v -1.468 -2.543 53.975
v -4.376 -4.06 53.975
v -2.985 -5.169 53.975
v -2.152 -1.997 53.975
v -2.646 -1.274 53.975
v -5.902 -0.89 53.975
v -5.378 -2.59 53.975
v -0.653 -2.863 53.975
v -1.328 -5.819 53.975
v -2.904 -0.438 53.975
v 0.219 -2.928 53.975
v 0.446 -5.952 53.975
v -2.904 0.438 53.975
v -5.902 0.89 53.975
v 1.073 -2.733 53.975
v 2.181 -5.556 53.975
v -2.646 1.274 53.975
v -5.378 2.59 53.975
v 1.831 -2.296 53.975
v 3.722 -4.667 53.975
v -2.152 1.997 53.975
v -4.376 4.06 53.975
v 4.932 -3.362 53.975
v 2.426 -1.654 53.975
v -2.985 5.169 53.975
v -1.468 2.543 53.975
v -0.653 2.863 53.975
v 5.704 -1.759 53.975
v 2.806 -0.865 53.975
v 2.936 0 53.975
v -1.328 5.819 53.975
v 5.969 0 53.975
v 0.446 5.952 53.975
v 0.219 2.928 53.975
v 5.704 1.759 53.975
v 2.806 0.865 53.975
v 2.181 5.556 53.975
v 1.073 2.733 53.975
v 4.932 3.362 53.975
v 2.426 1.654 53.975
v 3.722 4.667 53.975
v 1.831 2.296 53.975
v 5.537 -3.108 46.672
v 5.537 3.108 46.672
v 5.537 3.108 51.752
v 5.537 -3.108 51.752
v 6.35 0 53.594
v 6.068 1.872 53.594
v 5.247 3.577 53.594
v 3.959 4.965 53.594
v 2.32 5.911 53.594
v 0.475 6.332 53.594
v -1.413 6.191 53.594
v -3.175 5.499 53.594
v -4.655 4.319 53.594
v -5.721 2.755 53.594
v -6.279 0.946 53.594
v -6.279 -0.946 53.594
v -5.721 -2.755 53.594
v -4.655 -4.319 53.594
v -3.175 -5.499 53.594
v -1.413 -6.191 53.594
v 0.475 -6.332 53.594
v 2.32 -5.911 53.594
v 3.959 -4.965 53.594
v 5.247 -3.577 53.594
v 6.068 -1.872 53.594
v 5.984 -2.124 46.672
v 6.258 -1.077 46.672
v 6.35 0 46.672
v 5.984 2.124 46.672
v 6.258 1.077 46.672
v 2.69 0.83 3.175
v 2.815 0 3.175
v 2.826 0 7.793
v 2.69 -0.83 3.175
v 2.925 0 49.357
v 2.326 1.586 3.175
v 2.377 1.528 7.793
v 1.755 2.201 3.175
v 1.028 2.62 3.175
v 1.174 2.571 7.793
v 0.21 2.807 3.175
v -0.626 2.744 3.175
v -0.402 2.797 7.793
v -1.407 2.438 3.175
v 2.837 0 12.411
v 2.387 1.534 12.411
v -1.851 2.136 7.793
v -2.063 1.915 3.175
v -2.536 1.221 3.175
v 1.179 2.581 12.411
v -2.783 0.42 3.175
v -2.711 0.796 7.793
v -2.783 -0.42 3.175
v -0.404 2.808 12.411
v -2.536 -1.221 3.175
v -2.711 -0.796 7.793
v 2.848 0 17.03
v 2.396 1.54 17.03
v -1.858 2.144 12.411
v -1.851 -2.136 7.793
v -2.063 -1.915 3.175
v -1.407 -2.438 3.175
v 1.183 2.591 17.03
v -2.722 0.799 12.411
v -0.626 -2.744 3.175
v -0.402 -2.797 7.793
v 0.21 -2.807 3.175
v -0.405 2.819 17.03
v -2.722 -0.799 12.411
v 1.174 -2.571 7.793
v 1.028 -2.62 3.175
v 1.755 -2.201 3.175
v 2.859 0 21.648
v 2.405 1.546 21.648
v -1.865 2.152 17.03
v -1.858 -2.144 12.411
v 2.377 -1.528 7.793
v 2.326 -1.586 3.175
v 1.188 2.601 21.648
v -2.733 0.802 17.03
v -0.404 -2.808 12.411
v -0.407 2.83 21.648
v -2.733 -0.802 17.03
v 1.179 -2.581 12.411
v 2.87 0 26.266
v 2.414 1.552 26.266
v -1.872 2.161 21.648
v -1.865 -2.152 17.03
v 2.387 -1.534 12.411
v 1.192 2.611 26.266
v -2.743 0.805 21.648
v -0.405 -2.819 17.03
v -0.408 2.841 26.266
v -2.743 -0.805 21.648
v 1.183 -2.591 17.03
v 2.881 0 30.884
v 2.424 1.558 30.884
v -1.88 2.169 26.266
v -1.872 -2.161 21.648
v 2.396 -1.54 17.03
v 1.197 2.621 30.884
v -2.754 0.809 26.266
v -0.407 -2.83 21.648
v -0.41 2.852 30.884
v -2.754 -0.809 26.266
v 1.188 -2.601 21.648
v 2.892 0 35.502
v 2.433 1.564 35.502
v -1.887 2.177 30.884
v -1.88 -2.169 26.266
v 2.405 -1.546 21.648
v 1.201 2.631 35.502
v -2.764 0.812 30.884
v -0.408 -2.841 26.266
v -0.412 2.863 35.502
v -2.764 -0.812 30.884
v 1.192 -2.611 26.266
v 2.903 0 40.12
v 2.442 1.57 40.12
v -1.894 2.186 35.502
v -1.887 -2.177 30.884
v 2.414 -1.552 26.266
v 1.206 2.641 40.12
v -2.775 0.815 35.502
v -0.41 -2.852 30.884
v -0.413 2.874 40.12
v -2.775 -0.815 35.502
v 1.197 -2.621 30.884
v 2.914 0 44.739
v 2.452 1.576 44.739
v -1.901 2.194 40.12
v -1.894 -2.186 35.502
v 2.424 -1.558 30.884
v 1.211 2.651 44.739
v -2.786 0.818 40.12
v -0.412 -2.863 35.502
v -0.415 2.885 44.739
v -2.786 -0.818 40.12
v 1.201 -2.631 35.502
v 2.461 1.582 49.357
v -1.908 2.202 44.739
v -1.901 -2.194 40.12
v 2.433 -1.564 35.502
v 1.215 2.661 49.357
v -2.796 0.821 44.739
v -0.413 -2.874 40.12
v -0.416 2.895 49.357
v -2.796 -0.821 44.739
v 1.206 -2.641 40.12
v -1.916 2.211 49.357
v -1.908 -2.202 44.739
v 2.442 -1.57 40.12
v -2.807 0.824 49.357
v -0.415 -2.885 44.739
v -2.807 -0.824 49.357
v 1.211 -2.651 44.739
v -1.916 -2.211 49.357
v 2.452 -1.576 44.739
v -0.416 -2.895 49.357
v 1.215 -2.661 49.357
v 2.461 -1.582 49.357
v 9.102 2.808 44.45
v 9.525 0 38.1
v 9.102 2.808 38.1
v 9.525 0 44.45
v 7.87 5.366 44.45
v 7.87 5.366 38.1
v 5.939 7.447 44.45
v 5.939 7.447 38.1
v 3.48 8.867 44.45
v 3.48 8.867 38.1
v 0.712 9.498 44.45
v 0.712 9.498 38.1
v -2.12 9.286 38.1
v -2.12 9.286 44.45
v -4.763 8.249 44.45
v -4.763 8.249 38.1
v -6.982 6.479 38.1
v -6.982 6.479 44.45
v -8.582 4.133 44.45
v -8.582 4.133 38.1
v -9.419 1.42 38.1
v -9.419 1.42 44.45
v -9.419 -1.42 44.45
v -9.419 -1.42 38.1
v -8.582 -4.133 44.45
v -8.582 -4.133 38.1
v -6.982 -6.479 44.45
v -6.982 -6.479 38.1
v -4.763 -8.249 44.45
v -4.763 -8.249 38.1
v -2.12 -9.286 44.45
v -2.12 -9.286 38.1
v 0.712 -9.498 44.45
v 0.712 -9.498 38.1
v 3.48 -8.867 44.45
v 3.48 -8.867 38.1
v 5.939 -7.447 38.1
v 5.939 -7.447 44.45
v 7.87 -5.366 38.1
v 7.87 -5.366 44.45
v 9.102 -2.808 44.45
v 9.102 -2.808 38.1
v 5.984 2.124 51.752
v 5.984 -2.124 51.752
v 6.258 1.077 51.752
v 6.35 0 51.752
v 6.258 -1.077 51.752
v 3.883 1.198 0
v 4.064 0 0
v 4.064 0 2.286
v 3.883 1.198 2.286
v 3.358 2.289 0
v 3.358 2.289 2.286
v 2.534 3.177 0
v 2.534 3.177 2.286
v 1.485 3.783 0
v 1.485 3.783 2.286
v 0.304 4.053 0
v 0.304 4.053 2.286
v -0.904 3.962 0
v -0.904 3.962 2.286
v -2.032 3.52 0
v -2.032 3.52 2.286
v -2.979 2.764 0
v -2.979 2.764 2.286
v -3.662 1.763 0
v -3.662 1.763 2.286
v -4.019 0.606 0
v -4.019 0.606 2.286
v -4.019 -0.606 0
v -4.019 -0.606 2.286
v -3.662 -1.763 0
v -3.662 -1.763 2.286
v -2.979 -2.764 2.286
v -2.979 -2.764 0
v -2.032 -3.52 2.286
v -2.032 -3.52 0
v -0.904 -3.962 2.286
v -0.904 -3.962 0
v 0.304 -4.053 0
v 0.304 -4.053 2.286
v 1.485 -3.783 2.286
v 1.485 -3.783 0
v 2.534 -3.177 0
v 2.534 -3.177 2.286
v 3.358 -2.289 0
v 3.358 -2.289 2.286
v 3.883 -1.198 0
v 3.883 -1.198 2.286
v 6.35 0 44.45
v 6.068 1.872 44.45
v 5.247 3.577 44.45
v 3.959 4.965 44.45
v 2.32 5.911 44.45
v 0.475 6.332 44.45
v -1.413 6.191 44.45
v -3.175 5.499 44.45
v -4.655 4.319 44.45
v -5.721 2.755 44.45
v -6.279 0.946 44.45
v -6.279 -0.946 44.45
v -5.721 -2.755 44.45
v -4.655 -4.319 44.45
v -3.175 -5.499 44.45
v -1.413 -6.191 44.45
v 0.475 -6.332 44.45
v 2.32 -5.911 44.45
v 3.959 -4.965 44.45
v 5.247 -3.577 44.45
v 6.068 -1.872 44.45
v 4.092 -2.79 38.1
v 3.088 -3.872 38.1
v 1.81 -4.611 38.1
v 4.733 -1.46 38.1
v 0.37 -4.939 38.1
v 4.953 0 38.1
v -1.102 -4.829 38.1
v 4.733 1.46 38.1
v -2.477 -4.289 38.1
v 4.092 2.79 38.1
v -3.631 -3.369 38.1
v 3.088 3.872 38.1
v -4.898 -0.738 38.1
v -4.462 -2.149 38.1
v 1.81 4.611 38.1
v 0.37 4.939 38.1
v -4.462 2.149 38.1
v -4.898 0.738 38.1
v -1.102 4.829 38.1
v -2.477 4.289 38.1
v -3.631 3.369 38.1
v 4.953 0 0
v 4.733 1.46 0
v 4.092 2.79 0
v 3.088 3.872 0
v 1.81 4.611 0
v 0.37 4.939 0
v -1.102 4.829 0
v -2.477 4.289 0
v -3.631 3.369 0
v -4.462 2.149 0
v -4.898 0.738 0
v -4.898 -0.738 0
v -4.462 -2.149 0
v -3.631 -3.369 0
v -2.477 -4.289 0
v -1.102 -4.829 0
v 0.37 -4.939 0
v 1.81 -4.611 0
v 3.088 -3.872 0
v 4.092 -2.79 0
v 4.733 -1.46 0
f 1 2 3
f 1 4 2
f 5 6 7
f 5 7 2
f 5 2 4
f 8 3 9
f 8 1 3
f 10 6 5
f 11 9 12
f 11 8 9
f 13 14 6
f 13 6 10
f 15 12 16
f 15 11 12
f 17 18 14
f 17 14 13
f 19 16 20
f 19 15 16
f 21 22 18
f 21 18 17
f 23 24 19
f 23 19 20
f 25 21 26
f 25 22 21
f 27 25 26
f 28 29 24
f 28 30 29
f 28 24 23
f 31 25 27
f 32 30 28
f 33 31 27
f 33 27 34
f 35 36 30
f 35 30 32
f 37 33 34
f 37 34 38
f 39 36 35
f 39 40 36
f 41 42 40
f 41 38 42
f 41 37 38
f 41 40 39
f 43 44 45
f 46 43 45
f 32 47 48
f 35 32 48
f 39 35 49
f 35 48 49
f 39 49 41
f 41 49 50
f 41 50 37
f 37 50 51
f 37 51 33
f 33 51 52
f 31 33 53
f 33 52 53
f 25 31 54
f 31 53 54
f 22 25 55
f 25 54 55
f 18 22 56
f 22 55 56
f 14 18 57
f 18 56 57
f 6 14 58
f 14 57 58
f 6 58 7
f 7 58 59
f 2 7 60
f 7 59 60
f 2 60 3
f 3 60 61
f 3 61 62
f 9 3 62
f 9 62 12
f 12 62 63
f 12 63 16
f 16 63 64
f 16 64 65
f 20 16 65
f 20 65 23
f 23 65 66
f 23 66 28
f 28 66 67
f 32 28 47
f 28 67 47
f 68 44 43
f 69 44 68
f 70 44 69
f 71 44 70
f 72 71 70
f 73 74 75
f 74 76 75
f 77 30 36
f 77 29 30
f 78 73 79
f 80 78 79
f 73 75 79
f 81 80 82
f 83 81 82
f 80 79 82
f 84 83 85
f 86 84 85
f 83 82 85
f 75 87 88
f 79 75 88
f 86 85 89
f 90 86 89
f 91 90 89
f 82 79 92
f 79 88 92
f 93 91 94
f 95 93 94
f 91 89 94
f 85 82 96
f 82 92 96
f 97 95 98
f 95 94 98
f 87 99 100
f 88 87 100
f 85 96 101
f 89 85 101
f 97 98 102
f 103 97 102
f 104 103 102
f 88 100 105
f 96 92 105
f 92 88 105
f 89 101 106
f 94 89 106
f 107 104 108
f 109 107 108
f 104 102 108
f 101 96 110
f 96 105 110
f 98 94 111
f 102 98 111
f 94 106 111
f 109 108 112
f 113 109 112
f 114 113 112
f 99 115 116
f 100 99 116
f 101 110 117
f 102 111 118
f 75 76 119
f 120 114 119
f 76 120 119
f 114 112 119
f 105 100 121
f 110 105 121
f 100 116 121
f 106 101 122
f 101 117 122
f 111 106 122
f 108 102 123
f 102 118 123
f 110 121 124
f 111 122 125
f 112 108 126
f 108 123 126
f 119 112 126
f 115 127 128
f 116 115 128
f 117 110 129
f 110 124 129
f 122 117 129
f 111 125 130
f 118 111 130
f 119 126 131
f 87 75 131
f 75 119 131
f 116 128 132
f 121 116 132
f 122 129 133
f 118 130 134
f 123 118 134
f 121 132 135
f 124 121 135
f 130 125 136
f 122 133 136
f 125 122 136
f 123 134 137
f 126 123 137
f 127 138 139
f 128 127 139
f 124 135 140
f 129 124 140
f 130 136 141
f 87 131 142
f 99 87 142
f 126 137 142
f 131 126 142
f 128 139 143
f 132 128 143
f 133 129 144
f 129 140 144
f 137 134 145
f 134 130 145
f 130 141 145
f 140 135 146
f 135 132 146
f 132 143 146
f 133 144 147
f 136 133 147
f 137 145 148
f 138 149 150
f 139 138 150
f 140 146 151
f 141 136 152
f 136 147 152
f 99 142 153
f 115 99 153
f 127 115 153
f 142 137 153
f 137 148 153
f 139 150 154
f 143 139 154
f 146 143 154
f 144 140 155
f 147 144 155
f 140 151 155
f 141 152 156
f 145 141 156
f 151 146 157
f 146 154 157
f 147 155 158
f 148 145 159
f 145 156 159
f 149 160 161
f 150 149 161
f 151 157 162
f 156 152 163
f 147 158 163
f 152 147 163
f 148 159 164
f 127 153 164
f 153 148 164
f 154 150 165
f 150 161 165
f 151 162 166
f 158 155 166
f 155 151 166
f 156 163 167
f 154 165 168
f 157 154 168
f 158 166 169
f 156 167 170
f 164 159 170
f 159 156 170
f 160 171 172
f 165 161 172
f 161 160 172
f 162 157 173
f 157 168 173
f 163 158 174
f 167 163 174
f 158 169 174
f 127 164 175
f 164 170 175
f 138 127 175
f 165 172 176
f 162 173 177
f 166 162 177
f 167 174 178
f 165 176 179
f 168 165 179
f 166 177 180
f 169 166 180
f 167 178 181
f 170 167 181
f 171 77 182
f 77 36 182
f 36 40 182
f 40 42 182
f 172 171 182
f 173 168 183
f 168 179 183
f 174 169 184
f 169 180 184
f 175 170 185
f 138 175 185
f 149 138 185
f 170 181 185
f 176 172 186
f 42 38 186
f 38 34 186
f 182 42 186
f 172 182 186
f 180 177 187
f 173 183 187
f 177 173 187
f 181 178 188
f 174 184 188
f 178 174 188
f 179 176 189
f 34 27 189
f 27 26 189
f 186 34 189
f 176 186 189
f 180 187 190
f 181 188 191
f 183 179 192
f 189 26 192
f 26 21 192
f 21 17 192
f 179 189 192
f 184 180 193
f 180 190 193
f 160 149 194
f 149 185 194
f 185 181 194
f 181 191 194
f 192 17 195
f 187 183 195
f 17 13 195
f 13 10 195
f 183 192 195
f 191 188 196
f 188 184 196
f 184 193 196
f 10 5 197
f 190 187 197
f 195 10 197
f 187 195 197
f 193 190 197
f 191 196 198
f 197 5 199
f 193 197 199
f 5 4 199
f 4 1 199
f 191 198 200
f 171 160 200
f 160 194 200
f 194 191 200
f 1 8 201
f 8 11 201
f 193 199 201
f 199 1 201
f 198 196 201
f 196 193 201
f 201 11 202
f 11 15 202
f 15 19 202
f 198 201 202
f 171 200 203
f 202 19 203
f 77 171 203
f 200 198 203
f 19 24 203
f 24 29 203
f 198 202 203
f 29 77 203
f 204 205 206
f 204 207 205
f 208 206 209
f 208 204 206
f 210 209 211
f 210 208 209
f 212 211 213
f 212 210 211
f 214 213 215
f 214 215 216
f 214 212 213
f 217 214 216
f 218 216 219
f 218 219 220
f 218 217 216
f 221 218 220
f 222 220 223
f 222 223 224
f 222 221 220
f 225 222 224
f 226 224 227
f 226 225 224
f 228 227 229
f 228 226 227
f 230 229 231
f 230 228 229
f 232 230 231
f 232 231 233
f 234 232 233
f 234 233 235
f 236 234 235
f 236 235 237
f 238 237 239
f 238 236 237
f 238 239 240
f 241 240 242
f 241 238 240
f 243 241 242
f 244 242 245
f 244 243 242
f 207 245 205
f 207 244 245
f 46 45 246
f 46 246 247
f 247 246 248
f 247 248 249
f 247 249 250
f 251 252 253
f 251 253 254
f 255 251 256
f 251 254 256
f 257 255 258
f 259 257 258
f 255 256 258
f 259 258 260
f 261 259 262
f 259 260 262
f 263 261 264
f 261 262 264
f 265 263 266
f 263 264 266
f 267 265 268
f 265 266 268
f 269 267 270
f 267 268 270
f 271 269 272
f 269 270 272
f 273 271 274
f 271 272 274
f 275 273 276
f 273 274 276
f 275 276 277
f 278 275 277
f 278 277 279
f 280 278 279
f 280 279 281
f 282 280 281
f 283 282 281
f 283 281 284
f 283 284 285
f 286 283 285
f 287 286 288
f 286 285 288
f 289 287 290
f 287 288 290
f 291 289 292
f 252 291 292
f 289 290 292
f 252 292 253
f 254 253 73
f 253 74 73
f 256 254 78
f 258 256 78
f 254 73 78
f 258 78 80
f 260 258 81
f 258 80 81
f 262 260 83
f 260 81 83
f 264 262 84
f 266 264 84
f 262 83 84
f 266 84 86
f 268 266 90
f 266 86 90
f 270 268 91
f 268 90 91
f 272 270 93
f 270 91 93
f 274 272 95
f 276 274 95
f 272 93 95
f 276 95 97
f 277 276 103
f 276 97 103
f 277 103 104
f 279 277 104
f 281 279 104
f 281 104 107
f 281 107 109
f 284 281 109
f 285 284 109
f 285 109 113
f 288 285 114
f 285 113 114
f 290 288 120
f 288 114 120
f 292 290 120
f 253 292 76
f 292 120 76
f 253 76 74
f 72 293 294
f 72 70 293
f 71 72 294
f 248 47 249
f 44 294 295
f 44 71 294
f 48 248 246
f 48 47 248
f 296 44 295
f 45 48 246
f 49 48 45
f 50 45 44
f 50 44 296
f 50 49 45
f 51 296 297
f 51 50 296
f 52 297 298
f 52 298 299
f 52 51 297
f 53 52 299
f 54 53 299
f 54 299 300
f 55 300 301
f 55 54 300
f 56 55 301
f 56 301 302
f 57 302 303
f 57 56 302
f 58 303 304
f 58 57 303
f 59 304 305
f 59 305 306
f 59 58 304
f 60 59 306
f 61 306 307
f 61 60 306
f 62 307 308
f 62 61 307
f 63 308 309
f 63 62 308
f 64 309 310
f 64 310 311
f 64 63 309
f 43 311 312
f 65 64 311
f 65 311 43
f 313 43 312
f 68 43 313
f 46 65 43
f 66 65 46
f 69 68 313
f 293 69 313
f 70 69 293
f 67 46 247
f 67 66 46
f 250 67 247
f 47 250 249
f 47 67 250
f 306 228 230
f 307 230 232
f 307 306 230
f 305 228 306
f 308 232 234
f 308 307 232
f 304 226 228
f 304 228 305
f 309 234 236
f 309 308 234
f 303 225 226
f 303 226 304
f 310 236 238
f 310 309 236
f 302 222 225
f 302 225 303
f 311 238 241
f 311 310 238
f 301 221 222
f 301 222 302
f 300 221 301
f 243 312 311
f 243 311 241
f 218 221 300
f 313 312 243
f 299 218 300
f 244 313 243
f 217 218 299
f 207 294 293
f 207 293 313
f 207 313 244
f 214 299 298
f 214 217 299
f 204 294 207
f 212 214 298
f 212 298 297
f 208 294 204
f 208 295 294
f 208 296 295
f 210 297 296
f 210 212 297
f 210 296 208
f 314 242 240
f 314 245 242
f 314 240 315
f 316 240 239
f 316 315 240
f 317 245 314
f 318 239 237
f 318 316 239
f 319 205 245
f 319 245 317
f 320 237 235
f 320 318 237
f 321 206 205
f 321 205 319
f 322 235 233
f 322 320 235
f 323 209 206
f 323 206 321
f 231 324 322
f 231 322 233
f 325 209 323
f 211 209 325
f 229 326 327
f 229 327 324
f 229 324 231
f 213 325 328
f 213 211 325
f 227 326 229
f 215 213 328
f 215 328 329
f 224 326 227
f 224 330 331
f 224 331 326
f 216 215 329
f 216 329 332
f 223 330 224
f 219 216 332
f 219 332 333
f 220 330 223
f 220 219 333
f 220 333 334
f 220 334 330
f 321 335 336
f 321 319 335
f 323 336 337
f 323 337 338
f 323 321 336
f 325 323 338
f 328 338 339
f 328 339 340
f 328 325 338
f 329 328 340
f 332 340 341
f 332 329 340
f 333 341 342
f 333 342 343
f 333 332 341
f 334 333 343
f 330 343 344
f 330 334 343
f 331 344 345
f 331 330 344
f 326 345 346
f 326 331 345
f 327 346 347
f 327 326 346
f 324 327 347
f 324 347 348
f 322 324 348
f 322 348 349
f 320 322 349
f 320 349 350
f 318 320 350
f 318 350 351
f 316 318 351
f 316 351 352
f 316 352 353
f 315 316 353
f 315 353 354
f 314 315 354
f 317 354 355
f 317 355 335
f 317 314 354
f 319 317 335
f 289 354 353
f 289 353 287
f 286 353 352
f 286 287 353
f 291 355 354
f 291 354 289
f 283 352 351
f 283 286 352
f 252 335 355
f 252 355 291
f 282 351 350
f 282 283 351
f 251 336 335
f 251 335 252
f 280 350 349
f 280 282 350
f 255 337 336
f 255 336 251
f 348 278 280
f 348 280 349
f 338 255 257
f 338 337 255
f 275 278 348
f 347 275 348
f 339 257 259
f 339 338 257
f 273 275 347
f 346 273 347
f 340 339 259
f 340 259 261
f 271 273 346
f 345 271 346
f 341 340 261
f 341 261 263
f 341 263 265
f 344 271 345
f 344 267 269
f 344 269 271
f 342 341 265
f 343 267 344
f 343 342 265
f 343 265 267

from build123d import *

# Parameters (mm, degrees)
F4_SIZE  = 0.381
F5_W     = 1.5875
F5_H     = 5.08
F6_DEPTH = 12.7


with BuildPart() as f1:
    # F0 (on Front) → F1 (revolve)
    with BuildSketch(Plane.XZ):
        Polygon((0, 53.975), (0, 0), (4.953, 0), (4.953, 38.1), (9.525, 38.1), (9.525, 44.45), (6.35, 44.45), (6.35, 53.975), align=None)
    revolve(axis=Axis((0, 0, 26.9875), (0, 0, 1)))

    # F2 (on Front) → F3 (revolve, cut)
    with BuildSketch(Plane.XZ):
        Polygon((0, -0.254), (4.064, -0.254), (4.064, 2.286), (2.814903, 3.175), (2.939943, 55.497955), (0, 55.50498), (0, 53.903468), (0, 51.516321), align=None)
    revolve(axis=Axis((0, 0, 26.824734), (0, 0, 1)), mode=Mode.SUBTRACT)

    # F4
    f4_edges = [f1.edges().sort_by_distance(p)[0] for p in [
        (-6.35, 0, 53.975),
    ]]
    chamfer(f4_edges, length=F4_SIZE)

    # F5 (on Front) → F6 (cut, symmetric)
    with BuildSketch(Plane.XZ):
        with Locations((6.33095, 49.2125)):
            Rectangle(F5_W, F5_H)
    extrude(amount=F6_DEPTH, both=True, mode=Mode.SUBTRACT)


solid = f1.part
